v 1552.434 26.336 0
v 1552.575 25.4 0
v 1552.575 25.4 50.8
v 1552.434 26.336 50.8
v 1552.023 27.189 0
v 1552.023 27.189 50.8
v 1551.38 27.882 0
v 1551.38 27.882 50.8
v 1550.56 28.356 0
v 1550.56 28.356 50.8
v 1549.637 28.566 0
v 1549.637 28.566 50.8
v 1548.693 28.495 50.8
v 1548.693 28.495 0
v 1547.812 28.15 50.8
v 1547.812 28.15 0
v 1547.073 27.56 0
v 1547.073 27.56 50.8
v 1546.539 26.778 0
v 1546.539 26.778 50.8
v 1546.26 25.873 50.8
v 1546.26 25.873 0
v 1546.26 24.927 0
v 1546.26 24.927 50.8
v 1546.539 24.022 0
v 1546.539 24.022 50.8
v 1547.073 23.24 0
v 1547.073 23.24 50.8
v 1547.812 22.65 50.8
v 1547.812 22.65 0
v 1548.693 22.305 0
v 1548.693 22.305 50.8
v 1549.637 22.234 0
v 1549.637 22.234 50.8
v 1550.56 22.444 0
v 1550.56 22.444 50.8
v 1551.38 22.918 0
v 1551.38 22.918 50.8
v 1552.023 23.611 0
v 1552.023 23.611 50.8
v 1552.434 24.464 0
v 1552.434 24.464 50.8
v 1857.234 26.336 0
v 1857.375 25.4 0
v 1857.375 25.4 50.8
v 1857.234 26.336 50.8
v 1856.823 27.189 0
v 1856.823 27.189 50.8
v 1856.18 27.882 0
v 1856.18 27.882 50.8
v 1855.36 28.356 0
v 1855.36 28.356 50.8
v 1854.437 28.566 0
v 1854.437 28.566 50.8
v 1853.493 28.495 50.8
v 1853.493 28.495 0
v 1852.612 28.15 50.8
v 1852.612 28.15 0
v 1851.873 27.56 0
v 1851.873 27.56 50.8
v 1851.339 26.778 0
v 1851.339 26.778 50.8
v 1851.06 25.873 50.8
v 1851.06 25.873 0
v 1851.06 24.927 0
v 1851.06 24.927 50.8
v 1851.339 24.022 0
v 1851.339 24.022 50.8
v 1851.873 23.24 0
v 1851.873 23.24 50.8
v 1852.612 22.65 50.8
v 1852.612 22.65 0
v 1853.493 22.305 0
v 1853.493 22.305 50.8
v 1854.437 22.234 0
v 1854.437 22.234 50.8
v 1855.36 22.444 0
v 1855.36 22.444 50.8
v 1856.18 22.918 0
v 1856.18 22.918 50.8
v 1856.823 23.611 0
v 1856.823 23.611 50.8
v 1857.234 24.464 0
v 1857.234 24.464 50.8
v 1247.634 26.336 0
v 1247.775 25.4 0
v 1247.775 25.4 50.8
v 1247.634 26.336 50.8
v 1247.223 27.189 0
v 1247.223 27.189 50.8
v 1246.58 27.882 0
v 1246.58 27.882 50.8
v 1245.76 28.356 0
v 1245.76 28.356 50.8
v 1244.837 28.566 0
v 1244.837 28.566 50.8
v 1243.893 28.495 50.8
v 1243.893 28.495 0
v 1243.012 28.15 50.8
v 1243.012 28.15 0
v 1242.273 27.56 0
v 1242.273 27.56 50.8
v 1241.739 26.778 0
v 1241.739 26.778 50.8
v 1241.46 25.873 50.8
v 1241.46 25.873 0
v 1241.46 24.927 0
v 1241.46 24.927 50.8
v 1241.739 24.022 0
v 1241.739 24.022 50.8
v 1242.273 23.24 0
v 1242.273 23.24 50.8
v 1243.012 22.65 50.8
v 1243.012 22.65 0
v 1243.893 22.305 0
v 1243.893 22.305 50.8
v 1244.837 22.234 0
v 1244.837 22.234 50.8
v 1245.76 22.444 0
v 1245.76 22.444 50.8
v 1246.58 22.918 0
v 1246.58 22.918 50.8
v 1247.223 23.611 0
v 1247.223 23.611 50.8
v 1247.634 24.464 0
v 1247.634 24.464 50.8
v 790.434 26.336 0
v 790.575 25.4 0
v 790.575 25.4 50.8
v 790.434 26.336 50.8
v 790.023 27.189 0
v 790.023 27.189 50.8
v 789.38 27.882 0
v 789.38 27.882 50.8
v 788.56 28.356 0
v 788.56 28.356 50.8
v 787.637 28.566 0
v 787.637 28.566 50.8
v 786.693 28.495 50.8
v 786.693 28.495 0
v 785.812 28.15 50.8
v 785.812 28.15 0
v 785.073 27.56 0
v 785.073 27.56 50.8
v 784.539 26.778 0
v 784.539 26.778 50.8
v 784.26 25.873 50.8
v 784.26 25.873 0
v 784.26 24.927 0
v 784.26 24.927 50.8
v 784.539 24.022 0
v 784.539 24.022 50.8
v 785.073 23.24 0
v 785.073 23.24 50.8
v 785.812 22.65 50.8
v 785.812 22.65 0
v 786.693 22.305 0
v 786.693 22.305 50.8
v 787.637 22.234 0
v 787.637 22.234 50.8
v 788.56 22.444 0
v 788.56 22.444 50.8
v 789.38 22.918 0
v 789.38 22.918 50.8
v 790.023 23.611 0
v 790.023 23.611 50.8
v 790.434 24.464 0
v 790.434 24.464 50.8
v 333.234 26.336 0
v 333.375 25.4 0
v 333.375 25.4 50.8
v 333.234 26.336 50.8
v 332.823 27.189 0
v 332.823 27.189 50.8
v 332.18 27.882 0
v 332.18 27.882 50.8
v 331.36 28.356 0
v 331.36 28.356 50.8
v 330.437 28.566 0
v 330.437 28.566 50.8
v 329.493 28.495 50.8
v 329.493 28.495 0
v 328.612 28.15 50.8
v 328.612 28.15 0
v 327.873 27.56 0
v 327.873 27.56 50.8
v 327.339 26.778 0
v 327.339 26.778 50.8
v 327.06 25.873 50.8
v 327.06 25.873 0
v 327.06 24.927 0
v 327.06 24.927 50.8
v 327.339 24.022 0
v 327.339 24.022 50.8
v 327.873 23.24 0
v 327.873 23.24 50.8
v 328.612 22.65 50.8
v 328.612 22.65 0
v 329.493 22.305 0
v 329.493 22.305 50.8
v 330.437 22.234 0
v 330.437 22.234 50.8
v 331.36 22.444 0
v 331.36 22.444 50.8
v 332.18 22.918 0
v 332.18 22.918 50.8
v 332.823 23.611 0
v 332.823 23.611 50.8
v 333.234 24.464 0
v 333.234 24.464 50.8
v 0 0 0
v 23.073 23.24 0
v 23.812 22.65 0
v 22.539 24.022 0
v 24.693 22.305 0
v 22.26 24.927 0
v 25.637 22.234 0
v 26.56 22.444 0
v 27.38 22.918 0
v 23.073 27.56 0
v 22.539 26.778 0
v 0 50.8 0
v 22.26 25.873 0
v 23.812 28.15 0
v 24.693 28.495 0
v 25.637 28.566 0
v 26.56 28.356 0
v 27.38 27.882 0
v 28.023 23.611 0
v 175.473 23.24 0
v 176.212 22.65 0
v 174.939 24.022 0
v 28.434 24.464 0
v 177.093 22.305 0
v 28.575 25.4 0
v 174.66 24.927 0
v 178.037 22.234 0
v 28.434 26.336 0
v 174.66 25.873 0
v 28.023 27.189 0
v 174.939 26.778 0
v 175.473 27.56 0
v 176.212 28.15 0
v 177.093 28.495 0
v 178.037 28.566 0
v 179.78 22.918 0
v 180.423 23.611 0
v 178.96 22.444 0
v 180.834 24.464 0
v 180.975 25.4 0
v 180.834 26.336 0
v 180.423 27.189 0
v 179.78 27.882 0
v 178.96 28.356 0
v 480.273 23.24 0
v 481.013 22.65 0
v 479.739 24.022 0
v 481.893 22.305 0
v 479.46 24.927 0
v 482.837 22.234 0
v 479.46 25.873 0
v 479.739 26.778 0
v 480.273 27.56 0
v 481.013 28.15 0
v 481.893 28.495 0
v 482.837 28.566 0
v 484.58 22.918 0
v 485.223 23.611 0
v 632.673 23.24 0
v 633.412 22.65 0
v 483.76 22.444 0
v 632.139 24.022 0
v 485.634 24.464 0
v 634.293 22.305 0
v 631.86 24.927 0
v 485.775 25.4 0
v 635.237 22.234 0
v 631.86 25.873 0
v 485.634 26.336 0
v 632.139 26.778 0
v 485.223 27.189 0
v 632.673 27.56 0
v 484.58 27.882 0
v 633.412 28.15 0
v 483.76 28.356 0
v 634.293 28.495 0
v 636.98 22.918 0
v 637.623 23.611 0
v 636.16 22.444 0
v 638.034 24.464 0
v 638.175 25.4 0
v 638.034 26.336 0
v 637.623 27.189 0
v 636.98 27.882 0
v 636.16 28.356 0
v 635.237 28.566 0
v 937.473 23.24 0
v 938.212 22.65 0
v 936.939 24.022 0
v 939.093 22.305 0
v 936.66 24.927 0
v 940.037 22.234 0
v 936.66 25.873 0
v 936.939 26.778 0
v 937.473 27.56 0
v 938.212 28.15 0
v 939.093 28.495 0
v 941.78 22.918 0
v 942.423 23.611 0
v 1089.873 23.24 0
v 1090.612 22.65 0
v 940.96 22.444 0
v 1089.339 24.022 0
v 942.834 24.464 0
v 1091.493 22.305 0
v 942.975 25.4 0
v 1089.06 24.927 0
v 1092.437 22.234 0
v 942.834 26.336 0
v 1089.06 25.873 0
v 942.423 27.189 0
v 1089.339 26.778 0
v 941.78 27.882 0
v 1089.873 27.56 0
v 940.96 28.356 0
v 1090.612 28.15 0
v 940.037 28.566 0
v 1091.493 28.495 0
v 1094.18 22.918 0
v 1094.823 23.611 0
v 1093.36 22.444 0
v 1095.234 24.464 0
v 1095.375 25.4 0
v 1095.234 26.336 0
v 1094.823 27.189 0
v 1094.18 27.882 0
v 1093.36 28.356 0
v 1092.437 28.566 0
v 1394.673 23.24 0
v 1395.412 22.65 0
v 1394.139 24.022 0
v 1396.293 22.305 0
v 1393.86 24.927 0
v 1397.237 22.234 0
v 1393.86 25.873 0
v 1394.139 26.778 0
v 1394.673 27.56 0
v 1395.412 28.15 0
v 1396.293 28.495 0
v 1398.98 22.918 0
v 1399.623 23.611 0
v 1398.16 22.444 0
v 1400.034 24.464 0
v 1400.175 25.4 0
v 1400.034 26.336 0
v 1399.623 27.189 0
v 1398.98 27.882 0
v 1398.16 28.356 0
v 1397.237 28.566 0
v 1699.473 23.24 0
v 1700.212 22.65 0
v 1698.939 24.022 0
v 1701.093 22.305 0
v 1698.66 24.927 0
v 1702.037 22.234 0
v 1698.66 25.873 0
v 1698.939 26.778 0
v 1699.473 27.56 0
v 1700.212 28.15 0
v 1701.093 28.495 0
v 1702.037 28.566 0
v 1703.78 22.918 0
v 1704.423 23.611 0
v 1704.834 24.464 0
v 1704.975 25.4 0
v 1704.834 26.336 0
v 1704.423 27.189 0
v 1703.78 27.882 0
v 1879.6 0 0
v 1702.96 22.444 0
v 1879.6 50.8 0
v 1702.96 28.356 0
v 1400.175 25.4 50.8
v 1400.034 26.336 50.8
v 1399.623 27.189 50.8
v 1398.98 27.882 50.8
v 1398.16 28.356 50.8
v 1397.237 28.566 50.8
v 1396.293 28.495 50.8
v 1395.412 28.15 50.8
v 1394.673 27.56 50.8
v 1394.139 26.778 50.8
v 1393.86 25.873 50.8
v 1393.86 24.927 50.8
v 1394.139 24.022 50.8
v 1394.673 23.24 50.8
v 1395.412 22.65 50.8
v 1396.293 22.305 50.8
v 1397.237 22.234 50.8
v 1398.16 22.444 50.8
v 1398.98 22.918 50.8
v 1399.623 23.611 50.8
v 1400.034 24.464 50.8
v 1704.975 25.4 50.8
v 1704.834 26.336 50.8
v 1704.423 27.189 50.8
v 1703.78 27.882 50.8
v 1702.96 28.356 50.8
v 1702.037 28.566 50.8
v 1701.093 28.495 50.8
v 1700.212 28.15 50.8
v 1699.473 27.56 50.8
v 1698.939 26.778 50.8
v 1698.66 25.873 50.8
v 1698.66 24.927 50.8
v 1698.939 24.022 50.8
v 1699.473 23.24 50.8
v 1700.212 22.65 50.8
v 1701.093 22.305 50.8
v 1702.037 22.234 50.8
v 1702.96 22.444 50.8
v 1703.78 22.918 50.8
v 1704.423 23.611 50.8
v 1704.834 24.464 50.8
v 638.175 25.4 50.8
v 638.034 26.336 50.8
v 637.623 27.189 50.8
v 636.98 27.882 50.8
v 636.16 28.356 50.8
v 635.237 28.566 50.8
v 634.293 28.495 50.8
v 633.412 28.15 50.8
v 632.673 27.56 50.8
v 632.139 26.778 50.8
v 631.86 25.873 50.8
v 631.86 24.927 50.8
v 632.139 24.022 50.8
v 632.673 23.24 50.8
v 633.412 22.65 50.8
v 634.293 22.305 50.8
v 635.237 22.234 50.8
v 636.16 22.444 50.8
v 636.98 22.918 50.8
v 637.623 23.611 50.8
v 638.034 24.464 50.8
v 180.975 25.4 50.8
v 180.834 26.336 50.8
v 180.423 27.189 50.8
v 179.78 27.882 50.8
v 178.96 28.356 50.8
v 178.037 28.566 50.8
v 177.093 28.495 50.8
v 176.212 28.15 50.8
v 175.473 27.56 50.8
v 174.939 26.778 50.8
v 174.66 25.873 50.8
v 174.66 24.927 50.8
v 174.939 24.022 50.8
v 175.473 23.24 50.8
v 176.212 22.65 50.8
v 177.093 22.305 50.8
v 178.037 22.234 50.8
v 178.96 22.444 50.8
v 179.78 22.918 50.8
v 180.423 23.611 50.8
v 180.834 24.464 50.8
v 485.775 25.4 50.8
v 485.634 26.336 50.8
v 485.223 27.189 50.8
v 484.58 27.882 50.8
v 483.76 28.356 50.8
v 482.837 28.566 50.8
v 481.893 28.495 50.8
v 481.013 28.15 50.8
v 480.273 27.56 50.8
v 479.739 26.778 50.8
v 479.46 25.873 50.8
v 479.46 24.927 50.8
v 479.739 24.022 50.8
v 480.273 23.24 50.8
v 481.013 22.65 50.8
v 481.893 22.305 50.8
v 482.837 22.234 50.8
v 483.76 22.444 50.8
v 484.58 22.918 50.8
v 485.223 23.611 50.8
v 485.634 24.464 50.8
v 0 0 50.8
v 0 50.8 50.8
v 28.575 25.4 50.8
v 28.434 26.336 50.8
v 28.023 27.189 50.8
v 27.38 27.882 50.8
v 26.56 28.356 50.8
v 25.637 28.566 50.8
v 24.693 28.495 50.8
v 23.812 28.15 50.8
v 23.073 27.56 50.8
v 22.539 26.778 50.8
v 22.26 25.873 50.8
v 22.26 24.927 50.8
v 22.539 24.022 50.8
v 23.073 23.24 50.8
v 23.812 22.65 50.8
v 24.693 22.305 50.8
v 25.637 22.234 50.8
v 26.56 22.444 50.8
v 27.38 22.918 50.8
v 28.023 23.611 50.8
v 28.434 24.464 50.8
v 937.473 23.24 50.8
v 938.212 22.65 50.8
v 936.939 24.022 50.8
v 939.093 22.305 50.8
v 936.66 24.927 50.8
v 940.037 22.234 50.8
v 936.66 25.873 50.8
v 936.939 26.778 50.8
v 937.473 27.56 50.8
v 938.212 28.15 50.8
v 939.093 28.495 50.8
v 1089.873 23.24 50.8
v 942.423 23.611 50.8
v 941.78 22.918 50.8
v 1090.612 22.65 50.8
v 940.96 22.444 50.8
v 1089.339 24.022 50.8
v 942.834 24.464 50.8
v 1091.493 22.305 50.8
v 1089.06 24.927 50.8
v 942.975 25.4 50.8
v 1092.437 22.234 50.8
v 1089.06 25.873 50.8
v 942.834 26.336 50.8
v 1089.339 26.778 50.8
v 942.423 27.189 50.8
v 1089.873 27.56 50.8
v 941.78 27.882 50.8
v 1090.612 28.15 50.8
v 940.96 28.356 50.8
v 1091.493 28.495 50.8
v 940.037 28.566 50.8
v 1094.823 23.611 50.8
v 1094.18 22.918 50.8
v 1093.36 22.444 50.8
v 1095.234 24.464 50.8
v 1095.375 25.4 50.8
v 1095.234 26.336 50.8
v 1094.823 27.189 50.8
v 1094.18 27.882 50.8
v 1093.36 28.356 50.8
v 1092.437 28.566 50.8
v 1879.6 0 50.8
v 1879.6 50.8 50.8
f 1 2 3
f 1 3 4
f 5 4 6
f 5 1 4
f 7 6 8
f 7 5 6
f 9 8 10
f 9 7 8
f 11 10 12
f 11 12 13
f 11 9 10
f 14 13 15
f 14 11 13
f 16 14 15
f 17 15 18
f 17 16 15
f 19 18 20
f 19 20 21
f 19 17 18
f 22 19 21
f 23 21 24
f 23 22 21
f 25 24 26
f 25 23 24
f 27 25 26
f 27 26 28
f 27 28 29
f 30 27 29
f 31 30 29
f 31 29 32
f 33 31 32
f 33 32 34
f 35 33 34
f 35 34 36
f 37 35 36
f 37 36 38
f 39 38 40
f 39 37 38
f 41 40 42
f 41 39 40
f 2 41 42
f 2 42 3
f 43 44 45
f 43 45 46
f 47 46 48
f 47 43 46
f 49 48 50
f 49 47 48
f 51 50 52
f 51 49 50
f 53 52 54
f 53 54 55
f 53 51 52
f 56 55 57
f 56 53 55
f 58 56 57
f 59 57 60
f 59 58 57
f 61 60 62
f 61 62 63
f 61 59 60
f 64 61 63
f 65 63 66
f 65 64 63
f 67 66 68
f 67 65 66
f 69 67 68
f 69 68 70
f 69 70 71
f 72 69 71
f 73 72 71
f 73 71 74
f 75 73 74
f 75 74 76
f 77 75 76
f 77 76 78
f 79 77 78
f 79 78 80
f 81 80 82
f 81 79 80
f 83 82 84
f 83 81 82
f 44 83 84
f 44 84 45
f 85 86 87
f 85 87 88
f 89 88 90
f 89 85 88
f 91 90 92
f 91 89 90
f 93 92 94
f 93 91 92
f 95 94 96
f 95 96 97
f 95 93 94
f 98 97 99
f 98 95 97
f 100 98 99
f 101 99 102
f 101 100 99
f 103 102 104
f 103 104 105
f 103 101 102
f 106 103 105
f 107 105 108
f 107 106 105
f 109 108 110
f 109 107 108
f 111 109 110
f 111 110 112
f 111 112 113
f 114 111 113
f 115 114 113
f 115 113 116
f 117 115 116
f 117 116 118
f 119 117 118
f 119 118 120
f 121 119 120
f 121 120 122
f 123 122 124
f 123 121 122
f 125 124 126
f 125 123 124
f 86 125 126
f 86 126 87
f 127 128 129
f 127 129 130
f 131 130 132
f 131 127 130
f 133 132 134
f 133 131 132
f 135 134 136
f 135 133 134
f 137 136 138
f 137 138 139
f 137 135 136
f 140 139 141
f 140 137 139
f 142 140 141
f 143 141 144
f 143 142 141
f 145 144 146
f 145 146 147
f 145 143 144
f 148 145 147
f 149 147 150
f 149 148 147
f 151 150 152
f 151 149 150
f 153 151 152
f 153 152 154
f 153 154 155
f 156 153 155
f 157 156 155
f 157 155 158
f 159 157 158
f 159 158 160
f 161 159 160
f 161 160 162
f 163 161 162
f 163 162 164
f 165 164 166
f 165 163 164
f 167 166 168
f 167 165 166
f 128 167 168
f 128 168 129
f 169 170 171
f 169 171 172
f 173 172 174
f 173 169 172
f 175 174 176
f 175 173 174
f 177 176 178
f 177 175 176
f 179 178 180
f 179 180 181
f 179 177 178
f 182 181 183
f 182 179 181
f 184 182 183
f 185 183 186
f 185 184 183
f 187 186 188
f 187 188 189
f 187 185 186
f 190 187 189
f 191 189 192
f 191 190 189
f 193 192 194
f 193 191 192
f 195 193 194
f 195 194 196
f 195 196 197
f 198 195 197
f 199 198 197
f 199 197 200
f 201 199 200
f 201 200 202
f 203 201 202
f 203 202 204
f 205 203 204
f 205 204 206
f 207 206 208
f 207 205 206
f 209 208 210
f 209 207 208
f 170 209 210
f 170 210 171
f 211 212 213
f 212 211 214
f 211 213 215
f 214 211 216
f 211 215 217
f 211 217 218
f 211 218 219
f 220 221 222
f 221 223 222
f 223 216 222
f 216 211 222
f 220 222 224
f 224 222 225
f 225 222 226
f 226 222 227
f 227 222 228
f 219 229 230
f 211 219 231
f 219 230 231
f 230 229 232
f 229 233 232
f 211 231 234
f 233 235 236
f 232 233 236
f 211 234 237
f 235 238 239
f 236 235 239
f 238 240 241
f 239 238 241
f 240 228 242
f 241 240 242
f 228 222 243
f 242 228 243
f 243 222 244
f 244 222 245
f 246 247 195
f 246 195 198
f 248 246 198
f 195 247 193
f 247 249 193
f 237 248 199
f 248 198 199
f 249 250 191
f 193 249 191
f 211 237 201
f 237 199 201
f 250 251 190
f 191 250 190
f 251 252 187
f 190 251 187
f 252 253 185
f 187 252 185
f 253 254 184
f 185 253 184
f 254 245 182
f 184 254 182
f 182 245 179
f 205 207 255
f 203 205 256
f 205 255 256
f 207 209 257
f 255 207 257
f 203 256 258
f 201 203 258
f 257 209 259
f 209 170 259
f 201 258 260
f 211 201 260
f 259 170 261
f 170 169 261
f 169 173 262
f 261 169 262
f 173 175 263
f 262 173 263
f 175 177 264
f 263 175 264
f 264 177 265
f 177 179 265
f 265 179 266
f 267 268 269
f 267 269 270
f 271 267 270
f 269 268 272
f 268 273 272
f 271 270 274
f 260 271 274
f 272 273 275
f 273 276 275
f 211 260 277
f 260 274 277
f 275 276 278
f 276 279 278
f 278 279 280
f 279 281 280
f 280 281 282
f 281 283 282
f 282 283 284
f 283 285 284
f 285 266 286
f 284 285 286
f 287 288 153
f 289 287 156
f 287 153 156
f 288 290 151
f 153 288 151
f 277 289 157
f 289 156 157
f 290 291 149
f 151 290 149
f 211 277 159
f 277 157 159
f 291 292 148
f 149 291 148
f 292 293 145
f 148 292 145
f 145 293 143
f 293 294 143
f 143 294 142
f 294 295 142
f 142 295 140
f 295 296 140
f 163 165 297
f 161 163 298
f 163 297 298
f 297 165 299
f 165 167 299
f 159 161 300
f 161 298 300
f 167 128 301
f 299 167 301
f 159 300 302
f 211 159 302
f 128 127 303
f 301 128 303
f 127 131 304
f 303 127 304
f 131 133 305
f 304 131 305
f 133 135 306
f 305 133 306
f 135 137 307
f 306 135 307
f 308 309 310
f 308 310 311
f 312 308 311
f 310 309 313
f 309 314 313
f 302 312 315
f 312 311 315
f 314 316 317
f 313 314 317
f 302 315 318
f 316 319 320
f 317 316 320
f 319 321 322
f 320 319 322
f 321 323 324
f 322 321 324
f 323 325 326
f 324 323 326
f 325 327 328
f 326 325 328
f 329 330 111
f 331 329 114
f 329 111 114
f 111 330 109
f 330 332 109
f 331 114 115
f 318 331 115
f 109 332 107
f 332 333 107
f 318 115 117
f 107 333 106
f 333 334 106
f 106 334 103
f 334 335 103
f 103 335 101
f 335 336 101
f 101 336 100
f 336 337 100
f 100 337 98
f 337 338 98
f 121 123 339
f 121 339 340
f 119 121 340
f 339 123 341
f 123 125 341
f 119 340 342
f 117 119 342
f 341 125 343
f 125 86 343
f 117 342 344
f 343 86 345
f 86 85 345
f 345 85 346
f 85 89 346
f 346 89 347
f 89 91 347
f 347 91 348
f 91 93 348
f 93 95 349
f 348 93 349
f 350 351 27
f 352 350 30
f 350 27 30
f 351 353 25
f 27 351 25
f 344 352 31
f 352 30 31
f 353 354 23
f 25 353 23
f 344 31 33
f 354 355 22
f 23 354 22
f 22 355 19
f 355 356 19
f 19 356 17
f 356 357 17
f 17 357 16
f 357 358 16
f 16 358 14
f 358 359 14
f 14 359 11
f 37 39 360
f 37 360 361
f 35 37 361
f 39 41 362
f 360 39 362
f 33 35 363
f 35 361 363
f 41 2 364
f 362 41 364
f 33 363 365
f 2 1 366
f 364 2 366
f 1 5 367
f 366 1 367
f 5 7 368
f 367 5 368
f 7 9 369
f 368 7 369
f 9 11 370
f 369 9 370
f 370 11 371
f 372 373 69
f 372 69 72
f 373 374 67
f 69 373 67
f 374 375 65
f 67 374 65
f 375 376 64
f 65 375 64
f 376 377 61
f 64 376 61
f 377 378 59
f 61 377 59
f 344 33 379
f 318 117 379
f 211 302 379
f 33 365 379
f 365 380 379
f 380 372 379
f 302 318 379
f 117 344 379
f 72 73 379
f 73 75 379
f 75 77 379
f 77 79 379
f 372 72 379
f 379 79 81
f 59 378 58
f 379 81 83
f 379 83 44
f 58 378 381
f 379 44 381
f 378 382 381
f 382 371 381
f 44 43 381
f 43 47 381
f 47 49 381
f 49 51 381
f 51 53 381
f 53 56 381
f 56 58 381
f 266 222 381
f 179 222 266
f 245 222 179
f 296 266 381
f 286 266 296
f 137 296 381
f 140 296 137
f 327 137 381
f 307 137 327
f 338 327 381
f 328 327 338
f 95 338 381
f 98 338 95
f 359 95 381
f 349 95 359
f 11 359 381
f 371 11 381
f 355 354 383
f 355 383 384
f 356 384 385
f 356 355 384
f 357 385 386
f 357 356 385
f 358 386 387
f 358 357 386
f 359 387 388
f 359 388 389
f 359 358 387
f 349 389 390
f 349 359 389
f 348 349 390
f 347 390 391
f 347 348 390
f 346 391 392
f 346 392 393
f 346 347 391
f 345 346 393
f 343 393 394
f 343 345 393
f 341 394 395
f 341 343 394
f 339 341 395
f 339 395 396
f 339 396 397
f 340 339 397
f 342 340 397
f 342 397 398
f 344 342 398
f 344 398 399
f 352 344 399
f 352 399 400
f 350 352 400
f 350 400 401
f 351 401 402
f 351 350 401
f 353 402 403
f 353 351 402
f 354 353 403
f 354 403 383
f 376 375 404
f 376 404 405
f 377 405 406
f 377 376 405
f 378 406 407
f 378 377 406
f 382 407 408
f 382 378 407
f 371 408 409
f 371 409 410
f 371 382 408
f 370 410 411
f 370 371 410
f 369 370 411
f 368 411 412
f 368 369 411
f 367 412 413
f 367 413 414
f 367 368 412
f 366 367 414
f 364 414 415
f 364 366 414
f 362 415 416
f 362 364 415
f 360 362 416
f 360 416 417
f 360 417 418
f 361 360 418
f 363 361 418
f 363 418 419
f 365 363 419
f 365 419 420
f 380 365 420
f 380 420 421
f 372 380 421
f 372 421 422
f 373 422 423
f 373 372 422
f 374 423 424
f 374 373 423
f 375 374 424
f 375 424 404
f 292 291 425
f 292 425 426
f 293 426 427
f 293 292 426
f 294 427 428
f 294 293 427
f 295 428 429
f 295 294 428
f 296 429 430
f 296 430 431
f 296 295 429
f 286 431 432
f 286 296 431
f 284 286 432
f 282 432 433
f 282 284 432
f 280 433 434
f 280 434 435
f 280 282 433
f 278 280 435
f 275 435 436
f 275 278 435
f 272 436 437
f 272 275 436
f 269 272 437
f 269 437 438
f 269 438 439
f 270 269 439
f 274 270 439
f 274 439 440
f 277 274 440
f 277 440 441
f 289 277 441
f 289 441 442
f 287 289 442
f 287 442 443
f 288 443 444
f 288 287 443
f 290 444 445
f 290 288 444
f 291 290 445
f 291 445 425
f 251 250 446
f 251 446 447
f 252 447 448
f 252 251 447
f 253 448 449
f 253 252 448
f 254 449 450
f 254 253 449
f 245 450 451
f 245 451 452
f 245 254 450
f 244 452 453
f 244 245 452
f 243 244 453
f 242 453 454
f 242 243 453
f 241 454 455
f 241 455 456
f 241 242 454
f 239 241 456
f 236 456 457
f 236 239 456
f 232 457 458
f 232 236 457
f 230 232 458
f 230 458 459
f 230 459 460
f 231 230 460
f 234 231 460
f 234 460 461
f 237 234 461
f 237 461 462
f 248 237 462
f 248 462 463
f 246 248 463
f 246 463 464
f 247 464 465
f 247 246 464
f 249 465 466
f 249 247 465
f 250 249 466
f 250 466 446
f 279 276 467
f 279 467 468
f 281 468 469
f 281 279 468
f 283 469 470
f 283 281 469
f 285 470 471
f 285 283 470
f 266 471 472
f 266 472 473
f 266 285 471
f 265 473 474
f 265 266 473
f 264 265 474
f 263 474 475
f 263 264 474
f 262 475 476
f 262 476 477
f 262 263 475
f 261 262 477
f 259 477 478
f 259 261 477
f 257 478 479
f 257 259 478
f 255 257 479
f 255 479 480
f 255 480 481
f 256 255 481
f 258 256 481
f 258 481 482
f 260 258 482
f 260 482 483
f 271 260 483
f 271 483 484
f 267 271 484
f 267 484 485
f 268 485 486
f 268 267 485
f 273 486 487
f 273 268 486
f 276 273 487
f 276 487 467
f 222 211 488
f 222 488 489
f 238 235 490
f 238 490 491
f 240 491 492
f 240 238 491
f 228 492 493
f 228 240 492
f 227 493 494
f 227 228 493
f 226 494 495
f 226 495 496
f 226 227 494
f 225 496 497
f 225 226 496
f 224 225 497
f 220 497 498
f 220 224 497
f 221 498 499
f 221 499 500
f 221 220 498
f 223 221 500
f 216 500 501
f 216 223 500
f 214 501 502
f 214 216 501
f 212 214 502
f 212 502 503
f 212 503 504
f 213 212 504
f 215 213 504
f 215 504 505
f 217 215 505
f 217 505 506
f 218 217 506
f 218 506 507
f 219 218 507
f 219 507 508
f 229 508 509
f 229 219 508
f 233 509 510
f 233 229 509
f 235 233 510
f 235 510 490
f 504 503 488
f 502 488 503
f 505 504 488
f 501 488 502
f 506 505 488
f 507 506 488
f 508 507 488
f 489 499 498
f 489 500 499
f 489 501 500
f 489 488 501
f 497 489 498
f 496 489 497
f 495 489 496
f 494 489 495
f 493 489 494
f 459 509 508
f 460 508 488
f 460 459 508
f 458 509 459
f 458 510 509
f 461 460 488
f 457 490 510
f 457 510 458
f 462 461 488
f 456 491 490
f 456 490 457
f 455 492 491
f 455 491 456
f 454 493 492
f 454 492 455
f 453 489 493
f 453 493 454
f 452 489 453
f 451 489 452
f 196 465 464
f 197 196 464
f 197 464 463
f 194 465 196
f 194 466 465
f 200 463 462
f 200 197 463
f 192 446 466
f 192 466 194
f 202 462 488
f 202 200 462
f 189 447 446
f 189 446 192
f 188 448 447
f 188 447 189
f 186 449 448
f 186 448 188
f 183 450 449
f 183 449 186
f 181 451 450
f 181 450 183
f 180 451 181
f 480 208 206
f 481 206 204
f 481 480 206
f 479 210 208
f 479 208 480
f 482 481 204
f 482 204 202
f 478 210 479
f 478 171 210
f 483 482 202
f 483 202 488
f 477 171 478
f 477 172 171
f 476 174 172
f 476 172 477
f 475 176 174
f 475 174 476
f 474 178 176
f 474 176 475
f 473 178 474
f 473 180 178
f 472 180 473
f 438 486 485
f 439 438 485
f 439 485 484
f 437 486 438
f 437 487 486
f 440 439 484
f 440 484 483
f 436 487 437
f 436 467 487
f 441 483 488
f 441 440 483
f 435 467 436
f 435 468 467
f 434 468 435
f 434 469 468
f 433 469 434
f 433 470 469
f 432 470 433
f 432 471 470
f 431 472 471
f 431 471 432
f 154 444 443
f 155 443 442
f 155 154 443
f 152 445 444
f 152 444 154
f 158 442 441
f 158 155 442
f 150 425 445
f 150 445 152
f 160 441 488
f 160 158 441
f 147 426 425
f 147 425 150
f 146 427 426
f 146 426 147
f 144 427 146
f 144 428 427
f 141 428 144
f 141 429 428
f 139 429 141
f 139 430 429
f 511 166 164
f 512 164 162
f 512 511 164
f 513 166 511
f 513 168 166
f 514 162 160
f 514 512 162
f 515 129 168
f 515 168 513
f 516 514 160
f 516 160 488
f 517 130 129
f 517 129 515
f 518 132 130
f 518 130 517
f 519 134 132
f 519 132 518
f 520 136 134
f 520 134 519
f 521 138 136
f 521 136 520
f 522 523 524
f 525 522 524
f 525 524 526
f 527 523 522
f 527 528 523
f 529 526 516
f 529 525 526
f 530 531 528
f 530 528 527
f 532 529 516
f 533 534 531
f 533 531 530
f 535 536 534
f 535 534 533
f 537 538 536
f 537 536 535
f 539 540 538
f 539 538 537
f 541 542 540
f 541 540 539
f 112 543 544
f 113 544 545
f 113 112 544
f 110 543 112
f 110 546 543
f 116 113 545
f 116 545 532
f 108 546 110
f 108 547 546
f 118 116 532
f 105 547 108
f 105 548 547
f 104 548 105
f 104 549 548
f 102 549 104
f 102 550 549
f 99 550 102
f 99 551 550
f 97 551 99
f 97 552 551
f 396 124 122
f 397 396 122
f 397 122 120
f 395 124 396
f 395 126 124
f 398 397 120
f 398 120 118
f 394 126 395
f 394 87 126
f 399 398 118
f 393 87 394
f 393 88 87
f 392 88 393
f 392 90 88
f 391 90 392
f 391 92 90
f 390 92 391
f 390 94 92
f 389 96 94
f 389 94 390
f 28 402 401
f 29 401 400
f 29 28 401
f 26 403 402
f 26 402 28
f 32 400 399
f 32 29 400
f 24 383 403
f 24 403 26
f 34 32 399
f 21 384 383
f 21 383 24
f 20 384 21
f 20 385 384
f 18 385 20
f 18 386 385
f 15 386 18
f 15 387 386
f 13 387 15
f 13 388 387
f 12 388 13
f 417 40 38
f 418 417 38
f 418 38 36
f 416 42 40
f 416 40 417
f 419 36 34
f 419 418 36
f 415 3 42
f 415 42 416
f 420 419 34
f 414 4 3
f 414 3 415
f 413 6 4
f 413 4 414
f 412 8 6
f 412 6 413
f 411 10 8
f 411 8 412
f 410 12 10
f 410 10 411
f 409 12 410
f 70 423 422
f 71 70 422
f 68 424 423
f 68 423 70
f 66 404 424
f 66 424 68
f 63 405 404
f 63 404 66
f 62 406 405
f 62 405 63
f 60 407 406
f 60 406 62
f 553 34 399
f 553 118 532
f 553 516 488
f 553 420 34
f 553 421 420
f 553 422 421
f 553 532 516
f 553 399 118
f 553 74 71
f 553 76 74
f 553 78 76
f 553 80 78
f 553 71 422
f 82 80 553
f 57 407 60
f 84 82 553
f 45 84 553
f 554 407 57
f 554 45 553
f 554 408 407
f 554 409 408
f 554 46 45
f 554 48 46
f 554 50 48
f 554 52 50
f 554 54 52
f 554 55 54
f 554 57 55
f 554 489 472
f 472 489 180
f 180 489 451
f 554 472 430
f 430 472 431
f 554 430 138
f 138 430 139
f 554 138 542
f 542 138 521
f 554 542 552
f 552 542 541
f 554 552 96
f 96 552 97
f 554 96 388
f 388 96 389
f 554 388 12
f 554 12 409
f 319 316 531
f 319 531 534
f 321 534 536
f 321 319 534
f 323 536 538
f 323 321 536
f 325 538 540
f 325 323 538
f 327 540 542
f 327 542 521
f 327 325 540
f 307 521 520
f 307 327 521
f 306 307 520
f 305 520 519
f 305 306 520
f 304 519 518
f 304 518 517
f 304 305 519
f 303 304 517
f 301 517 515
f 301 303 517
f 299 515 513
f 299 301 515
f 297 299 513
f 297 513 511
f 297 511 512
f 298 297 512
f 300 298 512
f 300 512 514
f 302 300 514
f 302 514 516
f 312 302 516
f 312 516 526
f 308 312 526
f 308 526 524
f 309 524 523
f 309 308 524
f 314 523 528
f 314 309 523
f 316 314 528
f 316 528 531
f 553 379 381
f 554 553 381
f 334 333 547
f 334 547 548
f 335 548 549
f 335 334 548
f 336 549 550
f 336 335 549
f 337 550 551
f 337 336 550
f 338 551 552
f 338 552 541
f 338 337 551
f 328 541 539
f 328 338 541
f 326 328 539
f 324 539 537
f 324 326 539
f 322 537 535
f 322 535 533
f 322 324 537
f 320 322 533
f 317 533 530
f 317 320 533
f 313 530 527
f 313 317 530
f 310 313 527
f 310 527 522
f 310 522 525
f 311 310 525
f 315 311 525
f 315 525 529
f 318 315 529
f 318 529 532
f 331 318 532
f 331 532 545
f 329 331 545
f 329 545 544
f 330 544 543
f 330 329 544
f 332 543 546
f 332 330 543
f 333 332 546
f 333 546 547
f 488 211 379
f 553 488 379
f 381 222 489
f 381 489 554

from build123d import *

# Parameters (mm, degrees)
F0_W     = 1879.6
F0_H     = 50.8
F0_R     = 3.175
F1_DEPTH = 50.8


with BuildPart() as f1:
    # F0 (on Top) → F1 (new body)
    with BuildSketch(Plane.XY):
        with Locations((939.8, 25.4)):
            Rectangle(F0_W, F0_H)
        with Locations((25.4, 25.4)):
            Circle(F0_R, mode=Mode.SUBTRACT)
        with Locations((177.8, 25.4)):
            Circle(F0_R, mode=Mode.SUBTRACT)
        with Locations((330.2, 25.4)):
            Circle(F0_R, mode=Mode.SUBTRACT)
        with Locations((482.6, 25.4)):
            Circle(F0_R, mode=Mode.SUBTRACT)
        with Locations((635, 25.4)):
            Circle(F0_R, mode=Mode.SUBTRACT)
        with Locations((787.4, 25.4)):
            Circle(F0_R, mode=Mode.SUBTRACT)
        with Locations((939.8, 25.4)):
            Circle(F0_R, mode=Mode.SUBTRACT)
        with Locations((1092.2, 25.4)):
            Circle(F0_R, mode=Mode.SUBTRACT)
        with Locations((1244.6, 25.4)):
            Circle(F0_R, mode=Mode.SUBTRACT)
        with Locations((1397, 25.4)):
            Circle(F0_R, mode=Mode.SUBTRACT)
        with Locations((1549.4, 25.4)):
            Circle(F0_R, mode=Mode.SUBTRACT)
        with Locations((1701.8, 25.4)):
            Circle(F0_R, mode=Mode.SUBTRACT)
        with Locations((1854.2, 25.4)):
            Circle(F0_R, mode=Mode.SUBTRACT)
    extrude(amount=F1_DEPTH)


solid = f1.part
